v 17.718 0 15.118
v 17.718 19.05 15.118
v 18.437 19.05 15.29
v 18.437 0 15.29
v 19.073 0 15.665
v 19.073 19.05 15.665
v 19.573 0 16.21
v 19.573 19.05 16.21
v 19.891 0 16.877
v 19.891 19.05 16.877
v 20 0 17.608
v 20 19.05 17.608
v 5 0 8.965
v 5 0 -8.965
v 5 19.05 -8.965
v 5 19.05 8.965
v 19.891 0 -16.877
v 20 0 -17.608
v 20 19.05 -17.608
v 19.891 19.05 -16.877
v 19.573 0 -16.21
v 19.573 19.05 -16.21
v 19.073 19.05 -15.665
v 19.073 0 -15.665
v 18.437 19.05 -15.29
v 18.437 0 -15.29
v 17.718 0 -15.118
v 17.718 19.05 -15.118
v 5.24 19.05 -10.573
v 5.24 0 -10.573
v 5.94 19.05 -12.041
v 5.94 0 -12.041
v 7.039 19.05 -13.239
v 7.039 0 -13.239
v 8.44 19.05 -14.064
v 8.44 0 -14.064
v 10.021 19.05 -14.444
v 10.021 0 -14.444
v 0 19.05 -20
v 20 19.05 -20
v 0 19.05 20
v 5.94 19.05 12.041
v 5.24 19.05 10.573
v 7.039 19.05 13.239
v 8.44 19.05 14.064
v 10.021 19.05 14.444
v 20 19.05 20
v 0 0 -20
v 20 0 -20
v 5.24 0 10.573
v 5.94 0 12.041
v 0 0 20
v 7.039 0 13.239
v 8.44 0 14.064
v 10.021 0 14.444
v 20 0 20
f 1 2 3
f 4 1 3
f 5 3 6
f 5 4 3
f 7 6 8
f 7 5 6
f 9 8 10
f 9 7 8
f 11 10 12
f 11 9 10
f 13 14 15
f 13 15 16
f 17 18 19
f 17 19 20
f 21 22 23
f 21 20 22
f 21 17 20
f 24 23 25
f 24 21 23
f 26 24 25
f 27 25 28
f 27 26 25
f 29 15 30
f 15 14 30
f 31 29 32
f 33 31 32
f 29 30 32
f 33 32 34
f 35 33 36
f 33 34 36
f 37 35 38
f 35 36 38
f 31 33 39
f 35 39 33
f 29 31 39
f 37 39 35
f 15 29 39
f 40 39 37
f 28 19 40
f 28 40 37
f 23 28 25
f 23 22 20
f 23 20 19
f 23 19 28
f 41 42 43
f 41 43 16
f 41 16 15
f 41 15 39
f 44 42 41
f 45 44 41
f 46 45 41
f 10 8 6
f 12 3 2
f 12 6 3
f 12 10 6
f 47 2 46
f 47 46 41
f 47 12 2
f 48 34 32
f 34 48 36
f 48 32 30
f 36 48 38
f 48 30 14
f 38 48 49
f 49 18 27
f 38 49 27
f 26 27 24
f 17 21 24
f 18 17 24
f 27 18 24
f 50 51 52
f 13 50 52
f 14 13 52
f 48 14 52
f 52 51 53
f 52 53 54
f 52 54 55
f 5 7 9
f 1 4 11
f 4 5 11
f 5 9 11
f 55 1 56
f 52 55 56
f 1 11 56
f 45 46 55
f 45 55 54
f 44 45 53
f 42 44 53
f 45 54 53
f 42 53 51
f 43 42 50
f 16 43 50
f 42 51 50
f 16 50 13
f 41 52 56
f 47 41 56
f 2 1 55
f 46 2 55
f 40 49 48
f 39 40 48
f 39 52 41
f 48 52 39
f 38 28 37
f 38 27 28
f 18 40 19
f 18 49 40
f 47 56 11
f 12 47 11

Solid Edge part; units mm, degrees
sketch "Sketch1" plane through (0, 0, 0) normal (0, -1, 0) x (1, 0, 0)
  line L0 (20, -20) -> (0, -20)
  line L1 (0, 20) -> (0, -20)
  line L2 (0, 20) -> (20, 20)
  line L3 (20, 20) -> (20, 17.608)
  arc A0 (17.7179, 15.1175) -> (20, 17.608) centre (17.5, 17.608) ccw
  line L4 (17.7179, 15.1175) -> (10.0206, 14.4441)
  arc A1 (10.0206, 14.4441) -> (5, 8.965) centre (10.5, 8.965) ccw
  line L5 (5, -8.965) -> (5, 8.965)
  arc A2 (5, -8.965) -> (10.0206, -14.4441) centre (10.5, -8.965) ccw
  line L6 (17.7179, -15.1175) -> (10.0206, -14.4441)
  arc A3 (17.7179, -15.1175) -> (20, -17.608) centre (17.5, -17.608) cw
  line L7 (20, -20) -> (20, -17.608)
  dimension "D1" = 2.392
  dimension "D2" = 2.392
  dimension "D3" = 20
  dimension "D4" = 40
  dimension "D5" = 5
extrude "Protrusion1" add sketch "Sketch1" against normal blind 19.05
